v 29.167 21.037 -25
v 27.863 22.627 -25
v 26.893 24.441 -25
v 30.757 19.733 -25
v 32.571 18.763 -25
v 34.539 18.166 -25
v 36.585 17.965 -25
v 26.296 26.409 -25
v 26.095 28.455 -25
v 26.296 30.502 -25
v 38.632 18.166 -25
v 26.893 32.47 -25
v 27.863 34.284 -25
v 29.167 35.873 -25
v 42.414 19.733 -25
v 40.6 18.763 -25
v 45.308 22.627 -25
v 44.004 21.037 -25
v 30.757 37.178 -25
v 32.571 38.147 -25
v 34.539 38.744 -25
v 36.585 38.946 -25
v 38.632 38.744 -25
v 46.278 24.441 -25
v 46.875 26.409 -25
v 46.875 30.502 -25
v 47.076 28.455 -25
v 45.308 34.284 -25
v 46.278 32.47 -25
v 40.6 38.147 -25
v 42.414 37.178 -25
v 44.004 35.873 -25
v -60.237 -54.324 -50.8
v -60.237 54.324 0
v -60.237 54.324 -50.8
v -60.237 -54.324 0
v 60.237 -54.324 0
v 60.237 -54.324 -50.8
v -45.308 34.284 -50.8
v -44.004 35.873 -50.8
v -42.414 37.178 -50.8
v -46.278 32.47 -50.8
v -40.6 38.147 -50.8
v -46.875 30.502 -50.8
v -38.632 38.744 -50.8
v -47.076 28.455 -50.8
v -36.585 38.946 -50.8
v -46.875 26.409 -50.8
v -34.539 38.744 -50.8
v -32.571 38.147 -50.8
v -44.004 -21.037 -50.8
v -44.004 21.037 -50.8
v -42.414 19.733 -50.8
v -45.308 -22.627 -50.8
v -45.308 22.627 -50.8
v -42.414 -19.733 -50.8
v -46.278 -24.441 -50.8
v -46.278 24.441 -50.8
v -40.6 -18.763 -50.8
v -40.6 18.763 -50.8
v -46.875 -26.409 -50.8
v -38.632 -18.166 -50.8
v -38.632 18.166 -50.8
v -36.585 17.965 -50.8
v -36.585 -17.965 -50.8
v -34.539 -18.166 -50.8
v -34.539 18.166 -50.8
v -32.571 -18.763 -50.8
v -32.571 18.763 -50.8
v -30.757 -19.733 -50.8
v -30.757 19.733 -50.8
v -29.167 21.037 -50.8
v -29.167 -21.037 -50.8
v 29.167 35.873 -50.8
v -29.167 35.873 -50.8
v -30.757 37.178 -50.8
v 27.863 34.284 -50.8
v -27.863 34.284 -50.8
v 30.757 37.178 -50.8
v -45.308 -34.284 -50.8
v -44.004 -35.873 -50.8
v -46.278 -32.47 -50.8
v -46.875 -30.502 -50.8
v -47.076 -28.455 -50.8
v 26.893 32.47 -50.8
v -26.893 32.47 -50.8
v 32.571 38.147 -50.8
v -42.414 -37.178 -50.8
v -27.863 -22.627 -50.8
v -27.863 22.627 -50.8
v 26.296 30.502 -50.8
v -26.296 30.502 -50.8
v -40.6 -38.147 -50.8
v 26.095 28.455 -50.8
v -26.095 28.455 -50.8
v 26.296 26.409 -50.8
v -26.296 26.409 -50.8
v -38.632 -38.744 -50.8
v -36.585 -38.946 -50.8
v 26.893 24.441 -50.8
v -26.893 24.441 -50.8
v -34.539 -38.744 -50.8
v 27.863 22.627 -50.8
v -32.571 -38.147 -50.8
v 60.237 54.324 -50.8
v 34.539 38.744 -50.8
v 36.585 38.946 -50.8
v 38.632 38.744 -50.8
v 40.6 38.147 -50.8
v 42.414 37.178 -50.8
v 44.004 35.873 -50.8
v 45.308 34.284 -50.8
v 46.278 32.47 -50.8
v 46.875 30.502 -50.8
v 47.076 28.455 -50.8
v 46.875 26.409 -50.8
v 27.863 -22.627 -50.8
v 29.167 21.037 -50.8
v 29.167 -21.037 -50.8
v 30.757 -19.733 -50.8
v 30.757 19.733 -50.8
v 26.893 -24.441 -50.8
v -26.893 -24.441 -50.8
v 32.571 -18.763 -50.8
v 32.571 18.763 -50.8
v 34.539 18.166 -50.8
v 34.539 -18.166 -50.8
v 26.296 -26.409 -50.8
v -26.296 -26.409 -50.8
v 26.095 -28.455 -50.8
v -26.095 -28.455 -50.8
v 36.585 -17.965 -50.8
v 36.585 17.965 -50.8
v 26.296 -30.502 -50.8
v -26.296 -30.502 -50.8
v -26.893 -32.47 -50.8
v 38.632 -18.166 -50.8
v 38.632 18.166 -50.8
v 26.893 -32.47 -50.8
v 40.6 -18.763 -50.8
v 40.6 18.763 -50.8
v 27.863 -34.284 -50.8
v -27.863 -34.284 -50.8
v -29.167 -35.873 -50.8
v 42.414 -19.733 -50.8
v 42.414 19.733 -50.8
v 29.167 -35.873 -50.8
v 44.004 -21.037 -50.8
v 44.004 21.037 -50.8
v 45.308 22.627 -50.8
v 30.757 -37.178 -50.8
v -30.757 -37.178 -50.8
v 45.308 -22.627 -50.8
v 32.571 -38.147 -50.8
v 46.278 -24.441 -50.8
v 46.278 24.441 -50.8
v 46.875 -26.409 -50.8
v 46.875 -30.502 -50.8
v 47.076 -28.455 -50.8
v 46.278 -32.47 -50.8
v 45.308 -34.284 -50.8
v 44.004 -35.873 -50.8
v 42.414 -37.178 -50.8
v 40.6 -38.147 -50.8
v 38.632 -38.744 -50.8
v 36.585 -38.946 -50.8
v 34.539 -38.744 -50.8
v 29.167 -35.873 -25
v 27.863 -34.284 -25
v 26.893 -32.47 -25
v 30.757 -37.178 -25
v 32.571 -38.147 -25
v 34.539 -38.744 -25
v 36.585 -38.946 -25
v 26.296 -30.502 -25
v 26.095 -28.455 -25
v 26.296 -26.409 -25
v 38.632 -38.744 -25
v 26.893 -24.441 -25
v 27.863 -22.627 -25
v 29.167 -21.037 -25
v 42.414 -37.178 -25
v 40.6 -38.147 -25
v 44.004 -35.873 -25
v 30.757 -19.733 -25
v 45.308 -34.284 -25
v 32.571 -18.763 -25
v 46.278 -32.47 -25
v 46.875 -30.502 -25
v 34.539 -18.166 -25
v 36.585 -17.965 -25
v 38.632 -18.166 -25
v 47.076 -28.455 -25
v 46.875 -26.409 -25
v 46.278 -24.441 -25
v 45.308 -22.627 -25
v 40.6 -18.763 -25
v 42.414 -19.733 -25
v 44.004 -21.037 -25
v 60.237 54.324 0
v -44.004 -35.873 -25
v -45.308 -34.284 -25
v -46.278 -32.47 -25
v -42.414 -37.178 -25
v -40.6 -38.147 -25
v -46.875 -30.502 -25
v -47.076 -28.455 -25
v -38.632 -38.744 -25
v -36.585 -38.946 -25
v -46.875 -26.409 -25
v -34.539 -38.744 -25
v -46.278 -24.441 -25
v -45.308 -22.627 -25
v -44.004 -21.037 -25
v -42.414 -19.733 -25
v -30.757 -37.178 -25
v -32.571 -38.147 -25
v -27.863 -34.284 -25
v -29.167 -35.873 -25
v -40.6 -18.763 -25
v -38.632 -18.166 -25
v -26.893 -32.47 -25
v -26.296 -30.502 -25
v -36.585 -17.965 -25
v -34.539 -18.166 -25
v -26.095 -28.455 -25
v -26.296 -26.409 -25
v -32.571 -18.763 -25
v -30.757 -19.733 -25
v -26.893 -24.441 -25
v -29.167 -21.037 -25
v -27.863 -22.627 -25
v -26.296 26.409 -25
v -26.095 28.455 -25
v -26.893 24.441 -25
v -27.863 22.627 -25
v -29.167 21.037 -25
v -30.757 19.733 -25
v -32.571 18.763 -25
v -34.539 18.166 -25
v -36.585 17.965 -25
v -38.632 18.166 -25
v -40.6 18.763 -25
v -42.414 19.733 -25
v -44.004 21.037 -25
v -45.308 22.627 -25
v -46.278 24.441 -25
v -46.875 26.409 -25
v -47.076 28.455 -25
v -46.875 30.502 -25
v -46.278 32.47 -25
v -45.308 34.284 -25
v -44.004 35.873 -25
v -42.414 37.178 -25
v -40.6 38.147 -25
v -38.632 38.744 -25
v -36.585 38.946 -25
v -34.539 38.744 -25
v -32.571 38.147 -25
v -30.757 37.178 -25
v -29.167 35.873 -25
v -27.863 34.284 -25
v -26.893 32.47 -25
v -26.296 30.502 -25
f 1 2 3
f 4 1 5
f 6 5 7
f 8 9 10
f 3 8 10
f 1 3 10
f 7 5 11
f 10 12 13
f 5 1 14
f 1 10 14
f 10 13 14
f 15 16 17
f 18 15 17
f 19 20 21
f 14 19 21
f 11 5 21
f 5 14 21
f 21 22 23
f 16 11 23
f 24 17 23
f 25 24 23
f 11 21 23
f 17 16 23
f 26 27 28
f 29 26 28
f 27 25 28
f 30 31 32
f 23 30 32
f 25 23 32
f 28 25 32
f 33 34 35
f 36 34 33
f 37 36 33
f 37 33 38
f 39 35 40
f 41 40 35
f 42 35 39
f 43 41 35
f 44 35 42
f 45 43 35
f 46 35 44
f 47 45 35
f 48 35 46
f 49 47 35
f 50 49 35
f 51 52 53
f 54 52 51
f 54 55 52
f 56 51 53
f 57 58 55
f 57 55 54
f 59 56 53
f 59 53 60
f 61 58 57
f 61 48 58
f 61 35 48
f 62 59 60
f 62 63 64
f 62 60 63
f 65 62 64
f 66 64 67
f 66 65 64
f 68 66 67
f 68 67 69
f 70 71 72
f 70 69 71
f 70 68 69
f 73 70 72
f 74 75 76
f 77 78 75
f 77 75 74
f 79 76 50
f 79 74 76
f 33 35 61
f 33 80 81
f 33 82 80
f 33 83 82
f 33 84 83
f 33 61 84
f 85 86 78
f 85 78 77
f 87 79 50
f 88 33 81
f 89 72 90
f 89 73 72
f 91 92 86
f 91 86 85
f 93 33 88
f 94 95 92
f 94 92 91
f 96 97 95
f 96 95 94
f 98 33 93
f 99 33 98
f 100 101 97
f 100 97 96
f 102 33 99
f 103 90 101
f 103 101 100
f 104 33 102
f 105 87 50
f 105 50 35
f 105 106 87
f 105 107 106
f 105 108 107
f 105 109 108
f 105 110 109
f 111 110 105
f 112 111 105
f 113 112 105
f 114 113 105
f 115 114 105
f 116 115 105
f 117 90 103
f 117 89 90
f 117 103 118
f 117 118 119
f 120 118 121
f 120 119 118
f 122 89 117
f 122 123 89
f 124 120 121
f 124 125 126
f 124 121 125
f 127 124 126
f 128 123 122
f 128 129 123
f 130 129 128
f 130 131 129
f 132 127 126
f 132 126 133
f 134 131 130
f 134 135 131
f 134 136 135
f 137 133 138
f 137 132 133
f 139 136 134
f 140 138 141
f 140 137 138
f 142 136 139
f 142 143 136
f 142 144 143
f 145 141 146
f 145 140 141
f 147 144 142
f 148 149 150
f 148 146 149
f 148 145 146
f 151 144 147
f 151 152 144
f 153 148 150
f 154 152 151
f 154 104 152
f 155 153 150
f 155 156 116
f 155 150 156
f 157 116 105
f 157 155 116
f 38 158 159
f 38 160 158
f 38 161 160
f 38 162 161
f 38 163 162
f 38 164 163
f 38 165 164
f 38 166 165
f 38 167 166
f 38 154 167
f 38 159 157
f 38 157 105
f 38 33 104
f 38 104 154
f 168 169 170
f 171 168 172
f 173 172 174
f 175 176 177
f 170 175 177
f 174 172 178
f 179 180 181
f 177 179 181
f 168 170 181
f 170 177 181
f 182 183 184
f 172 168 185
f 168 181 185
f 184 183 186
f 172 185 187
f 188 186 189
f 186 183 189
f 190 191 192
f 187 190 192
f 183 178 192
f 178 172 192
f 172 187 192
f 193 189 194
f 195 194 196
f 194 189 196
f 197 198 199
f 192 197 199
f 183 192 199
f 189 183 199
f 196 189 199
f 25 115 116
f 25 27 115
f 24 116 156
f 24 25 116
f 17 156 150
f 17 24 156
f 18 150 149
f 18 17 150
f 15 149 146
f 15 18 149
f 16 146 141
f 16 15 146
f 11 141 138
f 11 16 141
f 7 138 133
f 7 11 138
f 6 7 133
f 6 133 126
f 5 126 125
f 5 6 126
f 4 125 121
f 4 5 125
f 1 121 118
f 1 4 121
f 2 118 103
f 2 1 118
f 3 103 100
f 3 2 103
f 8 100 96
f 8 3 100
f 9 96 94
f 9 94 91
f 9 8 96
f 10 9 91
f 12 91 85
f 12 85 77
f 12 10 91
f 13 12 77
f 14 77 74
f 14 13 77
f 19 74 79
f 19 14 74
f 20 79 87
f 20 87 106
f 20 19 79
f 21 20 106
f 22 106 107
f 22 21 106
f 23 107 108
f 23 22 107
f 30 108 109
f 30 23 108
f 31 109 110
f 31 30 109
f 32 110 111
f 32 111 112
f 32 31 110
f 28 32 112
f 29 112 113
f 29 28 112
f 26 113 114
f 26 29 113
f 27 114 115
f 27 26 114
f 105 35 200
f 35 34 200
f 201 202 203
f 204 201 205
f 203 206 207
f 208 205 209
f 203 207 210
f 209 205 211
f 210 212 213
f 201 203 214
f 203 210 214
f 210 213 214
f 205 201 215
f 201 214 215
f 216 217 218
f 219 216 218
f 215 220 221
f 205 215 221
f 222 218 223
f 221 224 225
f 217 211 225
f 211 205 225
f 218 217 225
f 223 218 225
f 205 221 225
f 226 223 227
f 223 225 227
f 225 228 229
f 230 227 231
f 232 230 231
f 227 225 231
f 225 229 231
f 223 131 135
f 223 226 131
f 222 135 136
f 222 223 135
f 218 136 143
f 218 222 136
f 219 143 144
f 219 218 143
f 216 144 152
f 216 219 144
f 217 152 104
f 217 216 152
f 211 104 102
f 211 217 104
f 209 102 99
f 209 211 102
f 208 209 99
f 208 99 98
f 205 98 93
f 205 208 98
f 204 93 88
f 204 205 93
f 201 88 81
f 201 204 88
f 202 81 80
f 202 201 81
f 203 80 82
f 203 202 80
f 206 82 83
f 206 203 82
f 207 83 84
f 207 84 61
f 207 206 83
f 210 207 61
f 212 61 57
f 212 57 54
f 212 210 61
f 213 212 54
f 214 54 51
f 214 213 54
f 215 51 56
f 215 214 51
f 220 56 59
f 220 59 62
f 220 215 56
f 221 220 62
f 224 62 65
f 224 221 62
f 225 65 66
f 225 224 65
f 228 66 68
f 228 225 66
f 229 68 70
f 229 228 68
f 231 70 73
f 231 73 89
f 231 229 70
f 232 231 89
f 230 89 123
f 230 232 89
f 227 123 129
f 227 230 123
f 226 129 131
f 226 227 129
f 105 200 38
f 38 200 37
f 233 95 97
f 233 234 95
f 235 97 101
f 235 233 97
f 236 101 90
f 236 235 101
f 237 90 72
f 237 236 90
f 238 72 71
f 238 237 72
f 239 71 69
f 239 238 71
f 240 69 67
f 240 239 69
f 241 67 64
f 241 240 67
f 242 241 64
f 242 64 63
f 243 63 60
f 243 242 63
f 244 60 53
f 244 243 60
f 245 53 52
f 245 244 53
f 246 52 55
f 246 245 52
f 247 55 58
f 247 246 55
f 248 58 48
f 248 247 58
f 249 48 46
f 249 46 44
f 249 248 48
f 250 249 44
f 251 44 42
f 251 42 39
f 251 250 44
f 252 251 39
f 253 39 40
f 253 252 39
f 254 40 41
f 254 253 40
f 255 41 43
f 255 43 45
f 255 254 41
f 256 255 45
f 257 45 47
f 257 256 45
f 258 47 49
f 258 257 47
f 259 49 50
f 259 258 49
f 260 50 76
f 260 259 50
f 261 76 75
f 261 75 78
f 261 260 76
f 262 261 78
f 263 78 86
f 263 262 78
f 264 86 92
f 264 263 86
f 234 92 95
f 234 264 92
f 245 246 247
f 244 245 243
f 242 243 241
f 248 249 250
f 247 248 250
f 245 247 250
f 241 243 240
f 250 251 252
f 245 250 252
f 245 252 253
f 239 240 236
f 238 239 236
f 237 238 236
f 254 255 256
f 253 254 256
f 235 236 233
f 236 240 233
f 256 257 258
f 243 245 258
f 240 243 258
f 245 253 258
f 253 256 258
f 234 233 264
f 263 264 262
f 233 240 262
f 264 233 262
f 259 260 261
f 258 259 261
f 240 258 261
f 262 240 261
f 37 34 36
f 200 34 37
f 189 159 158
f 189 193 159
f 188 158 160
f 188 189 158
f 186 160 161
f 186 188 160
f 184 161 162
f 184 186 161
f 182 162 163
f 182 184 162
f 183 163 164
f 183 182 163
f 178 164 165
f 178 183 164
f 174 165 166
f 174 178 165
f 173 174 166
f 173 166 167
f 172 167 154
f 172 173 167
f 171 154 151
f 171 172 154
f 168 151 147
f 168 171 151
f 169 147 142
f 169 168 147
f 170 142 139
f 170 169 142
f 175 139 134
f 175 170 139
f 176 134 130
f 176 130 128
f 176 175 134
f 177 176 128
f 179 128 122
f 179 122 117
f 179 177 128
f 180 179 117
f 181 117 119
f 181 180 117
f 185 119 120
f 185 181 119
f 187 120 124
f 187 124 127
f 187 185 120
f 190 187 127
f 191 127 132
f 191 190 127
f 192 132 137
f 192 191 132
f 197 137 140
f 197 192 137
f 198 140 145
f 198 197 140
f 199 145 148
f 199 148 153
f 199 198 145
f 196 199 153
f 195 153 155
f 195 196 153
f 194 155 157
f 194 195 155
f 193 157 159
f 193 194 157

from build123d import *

# Parameters (mm, degrees)
F0_W      = 120.473326
F0_H      = 108.647734
F1_DEPTH  = 25
F3_R      = 5.08
F2_W      = 120.473326
F2_H      = 108.647734
F2_R      = 10.490665
F4_DEPTH  = 25.4
F4_FACE_W = 120.473326
F4_FACE_H = 108.647734
F4_FACE_R = 10.490665
F5_DEPTH  = 25.4


with BuildPart() as f1:
    # F0 (on Top) → F1 (new body)
    with BuildSketch(Plane.XY):
        Rectangle(F0_W, F0_H)
    extrude(amount=-F1_DEPTH)

    # F3
    f3_edges = [f1.edges().sort_by_distance(p)[0] for p in [
        (0, -54.323867, -25),
        (-60.236663, 0, -25),
        (0, 54.323867, -25),
        (60.236663, 0, -25),
        (60.236663, -54.323867, -12.5),
        (60.236663, 0, 0),
        (60.236663, 54.323867, -12.5),
        (-60.236663, -54.323867, -12.5),
        (0, -54.323867, 0),
        (-60.236663, 0, 0),
        (0, 54.323867, 0),
        (-60.236663, 54.323867, -12.5),
    ]]
    fillet(f3_edges, radius=F3_R)

    # F2 (on face) → F4 (join)
    with BuildSketch(Plane.XY):
        Rectangle(F2_W, F2_H)
        with Locations((-36.585487, -28.455362)):
            Circle(F2_R, mode=Mode.SUBTRACT)
        with Locations((36.585487, -28.455362)):
            Circle(F2_R, mode=Mode.SUBTRACT)
        with Locations((-36.585487, 28.455362)):
            Circle(F2_R, mode=Mode.SUBTRACT)
        with Locations((36.585487, 28.455362)):
            Circle(F2_R, mode=Mode.SUBTRACT)
    extrude(amount=-F4_DEPTH)

    # F4_face (on face) → F5 (join)
    with BuildSketch(Plane(origin=(0, 0, -25.4), x_dir=(1, 0, 0), z_dir=(0, 0, -1))):
        Rectangle(F4_FACE_W, F4_FACE_H)
        with Locations((-36.585487, 28.455362)):
            Circle(F4_FACE_R, mode=Mode.SUBTRACT)
        with Locations((36.585487, 28.455362)):
            Circle(F4_FACE_R, mode=Mode.SUBTRACT)
        with Locations((-36.585487, -28.455362)):
            Circle(F4_FACE_R, mode=Mode.SUBTRACT)
        with Locations((36.585487, -28.455362)):
            Circle(F4_FACE_R, mode=Mode.SUBTRACT)
    extrude(amount=F5_DEPTH)


solid = f1.part
